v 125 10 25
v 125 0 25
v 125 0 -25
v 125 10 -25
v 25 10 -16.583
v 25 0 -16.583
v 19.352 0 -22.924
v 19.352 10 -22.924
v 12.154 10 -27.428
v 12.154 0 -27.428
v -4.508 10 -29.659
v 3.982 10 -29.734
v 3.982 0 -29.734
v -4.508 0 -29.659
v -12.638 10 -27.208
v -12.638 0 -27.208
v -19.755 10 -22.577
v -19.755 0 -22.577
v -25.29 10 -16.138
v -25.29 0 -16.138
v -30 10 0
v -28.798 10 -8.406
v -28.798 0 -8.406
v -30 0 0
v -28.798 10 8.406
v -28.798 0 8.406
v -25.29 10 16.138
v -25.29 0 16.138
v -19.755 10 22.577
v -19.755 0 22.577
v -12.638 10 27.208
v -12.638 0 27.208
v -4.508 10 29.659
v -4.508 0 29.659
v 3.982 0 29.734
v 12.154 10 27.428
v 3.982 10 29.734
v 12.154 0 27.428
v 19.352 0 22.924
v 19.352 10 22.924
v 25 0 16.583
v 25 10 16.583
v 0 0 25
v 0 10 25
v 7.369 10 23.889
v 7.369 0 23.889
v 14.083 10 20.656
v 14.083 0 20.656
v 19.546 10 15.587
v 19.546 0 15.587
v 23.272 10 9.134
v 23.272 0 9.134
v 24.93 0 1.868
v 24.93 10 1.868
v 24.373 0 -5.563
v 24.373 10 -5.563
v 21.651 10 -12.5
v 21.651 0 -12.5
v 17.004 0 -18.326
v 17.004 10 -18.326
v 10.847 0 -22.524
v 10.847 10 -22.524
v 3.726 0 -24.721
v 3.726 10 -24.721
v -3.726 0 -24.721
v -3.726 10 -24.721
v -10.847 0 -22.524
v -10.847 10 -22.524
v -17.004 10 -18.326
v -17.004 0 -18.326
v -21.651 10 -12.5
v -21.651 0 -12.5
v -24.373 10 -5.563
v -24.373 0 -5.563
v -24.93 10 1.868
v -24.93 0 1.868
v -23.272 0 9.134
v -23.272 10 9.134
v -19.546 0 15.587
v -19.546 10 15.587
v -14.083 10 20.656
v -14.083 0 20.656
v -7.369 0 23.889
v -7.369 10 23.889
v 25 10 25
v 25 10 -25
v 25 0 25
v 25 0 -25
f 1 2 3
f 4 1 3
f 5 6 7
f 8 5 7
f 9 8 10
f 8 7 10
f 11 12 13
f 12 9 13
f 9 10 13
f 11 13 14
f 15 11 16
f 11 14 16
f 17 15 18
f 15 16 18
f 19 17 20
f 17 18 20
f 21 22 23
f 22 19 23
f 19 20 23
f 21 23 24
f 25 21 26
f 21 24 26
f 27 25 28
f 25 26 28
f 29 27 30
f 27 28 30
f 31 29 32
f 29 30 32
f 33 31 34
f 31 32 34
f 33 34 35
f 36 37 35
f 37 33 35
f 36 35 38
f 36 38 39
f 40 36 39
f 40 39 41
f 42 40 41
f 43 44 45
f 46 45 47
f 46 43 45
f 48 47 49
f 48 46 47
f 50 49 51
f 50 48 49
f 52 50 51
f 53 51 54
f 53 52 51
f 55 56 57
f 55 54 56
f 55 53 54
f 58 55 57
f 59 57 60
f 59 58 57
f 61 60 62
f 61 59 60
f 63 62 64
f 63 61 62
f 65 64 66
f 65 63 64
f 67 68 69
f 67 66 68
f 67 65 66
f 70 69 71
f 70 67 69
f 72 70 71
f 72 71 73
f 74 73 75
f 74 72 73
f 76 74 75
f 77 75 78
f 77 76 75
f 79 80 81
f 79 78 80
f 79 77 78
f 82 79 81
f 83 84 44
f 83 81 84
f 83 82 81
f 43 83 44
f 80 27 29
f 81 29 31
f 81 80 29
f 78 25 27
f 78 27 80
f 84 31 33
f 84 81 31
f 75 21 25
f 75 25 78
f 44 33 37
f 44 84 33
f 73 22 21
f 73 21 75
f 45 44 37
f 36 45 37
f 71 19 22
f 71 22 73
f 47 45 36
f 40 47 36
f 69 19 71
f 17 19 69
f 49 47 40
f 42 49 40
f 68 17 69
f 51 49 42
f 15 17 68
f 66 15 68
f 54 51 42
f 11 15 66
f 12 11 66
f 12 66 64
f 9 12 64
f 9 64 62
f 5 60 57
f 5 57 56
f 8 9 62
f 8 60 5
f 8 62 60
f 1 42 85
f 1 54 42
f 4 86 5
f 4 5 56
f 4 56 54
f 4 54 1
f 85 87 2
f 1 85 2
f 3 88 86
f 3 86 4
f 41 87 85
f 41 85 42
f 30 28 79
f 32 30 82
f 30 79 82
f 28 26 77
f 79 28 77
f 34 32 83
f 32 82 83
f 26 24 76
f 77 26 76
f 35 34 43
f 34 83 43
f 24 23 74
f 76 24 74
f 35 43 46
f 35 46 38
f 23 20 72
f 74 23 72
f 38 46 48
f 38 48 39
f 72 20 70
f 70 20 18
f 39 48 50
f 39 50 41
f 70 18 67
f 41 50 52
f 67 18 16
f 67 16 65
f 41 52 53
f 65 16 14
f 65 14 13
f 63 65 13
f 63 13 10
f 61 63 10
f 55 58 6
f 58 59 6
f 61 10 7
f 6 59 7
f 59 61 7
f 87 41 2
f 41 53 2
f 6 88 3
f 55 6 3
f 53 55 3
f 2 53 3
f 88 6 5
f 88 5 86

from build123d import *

# Parameters (mm, degrees)
SKETCH1_R           = 30
SKETCH1_R_2         = 25
BOSS_EXTRUDE1_DEPTH = 10
SKETCH3_W           = 100
SKETCH3_H           = 50
BOSS_EXTRUDE2_DEPTH = 10


with BuildPart() as part:
    # Sketch1 → Boss-Extrude1 (new body)
    with BuildSketch(Plane(origin=(0, 0, 0), x_dir=(1, 0, 0), z_dir=(0, 1, 0))):
        with Locations(Location((0, 0, 0), (0, 0, 270))):
            Circle(SKETCH1_R)
        with Locations(Location((0, 0, 0), (0, 0, 270))):
            Circle(SKETCH1_R_2, mode=Mode.SUBTRACT)
    extrude(amount=BOSS_EXTRUDE1_DEPTH)

    # Sketch3 → Boss-Extrude2 (add)
    with BuildSketch(Plane(origin=(0, 0, 0), x_dir=(1, 0, 0), z_dir=(0, 1, 0))):
        with Locations((75, 0)):
            Rectangle(SKETCH3_W, SKETCH3_H)
    extrude(amount=BOSS_EXTRUDE2_DEPTH)


solid = part.part
